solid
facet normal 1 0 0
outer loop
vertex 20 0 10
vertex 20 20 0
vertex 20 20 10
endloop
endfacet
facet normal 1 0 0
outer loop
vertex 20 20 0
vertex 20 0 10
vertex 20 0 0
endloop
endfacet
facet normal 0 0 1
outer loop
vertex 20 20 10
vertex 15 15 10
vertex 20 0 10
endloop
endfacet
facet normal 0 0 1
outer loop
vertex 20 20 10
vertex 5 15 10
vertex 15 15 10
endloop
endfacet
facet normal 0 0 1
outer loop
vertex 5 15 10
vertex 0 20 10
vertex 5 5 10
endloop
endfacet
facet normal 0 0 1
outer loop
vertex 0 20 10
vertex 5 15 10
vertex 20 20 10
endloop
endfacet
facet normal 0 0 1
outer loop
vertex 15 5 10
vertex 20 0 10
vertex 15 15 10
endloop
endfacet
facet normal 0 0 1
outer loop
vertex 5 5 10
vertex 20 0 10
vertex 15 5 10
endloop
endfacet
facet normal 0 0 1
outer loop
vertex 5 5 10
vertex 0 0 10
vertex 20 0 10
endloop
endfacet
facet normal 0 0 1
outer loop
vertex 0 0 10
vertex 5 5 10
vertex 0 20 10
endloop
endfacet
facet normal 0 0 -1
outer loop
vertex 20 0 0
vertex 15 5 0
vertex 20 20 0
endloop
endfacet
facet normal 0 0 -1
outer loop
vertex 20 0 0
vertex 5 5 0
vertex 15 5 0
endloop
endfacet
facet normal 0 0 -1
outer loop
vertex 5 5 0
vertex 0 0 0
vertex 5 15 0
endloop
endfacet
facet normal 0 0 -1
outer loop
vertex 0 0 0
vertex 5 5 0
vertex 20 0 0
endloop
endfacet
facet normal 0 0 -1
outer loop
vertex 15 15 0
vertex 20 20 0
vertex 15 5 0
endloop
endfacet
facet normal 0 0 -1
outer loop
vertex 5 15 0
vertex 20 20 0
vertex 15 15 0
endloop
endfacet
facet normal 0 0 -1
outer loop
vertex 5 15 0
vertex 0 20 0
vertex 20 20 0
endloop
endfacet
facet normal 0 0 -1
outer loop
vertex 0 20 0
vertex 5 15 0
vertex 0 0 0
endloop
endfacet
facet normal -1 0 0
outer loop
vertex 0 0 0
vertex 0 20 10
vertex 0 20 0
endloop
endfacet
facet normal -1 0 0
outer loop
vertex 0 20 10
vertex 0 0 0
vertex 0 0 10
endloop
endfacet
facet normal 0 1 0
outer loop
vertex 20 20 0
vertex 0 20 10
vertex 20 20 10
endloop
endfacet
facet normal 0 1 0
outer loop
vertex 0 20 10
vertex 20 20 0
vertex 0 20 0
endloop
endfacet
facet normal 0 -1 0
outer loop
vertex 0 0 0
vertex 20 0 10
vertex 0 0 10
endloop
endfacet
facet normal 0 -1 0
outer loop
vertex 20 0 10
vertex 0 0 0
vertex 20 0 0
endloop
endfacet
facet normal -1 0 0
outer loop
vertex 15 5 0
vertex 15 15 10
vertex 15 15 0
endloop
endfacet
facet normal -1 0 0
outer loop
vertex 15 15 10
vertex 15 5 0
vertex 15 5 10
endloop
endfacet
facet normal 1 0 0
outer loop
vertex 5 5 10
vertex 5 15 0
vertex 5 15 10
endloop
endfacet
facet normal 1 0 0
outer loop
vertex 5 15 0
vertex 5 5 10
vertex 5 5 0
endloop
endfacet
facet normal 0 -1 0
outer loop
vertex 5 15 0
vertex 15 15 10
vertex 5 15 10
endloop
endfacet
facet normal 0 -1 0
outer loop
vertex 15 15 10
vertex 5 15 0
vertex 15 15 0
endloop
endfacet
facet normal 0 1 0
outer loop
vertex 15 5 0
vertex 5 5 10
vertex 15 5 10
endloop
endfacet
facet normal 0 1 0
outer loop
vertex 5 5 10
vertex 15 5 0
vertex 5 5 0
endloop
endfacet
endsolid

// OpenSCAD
// The classic trap: the subtrahend is flush with the minuend on z=0 and z=10.
// mesh.ts names coplanar faces as failure mode (1) in its header; this case is
// here to MEASURE that, not to avoid it.
difference() {
  cube([20, 20, 10]);
  translate([5, 5, 0]) cube([10, 10, 10]);
}
